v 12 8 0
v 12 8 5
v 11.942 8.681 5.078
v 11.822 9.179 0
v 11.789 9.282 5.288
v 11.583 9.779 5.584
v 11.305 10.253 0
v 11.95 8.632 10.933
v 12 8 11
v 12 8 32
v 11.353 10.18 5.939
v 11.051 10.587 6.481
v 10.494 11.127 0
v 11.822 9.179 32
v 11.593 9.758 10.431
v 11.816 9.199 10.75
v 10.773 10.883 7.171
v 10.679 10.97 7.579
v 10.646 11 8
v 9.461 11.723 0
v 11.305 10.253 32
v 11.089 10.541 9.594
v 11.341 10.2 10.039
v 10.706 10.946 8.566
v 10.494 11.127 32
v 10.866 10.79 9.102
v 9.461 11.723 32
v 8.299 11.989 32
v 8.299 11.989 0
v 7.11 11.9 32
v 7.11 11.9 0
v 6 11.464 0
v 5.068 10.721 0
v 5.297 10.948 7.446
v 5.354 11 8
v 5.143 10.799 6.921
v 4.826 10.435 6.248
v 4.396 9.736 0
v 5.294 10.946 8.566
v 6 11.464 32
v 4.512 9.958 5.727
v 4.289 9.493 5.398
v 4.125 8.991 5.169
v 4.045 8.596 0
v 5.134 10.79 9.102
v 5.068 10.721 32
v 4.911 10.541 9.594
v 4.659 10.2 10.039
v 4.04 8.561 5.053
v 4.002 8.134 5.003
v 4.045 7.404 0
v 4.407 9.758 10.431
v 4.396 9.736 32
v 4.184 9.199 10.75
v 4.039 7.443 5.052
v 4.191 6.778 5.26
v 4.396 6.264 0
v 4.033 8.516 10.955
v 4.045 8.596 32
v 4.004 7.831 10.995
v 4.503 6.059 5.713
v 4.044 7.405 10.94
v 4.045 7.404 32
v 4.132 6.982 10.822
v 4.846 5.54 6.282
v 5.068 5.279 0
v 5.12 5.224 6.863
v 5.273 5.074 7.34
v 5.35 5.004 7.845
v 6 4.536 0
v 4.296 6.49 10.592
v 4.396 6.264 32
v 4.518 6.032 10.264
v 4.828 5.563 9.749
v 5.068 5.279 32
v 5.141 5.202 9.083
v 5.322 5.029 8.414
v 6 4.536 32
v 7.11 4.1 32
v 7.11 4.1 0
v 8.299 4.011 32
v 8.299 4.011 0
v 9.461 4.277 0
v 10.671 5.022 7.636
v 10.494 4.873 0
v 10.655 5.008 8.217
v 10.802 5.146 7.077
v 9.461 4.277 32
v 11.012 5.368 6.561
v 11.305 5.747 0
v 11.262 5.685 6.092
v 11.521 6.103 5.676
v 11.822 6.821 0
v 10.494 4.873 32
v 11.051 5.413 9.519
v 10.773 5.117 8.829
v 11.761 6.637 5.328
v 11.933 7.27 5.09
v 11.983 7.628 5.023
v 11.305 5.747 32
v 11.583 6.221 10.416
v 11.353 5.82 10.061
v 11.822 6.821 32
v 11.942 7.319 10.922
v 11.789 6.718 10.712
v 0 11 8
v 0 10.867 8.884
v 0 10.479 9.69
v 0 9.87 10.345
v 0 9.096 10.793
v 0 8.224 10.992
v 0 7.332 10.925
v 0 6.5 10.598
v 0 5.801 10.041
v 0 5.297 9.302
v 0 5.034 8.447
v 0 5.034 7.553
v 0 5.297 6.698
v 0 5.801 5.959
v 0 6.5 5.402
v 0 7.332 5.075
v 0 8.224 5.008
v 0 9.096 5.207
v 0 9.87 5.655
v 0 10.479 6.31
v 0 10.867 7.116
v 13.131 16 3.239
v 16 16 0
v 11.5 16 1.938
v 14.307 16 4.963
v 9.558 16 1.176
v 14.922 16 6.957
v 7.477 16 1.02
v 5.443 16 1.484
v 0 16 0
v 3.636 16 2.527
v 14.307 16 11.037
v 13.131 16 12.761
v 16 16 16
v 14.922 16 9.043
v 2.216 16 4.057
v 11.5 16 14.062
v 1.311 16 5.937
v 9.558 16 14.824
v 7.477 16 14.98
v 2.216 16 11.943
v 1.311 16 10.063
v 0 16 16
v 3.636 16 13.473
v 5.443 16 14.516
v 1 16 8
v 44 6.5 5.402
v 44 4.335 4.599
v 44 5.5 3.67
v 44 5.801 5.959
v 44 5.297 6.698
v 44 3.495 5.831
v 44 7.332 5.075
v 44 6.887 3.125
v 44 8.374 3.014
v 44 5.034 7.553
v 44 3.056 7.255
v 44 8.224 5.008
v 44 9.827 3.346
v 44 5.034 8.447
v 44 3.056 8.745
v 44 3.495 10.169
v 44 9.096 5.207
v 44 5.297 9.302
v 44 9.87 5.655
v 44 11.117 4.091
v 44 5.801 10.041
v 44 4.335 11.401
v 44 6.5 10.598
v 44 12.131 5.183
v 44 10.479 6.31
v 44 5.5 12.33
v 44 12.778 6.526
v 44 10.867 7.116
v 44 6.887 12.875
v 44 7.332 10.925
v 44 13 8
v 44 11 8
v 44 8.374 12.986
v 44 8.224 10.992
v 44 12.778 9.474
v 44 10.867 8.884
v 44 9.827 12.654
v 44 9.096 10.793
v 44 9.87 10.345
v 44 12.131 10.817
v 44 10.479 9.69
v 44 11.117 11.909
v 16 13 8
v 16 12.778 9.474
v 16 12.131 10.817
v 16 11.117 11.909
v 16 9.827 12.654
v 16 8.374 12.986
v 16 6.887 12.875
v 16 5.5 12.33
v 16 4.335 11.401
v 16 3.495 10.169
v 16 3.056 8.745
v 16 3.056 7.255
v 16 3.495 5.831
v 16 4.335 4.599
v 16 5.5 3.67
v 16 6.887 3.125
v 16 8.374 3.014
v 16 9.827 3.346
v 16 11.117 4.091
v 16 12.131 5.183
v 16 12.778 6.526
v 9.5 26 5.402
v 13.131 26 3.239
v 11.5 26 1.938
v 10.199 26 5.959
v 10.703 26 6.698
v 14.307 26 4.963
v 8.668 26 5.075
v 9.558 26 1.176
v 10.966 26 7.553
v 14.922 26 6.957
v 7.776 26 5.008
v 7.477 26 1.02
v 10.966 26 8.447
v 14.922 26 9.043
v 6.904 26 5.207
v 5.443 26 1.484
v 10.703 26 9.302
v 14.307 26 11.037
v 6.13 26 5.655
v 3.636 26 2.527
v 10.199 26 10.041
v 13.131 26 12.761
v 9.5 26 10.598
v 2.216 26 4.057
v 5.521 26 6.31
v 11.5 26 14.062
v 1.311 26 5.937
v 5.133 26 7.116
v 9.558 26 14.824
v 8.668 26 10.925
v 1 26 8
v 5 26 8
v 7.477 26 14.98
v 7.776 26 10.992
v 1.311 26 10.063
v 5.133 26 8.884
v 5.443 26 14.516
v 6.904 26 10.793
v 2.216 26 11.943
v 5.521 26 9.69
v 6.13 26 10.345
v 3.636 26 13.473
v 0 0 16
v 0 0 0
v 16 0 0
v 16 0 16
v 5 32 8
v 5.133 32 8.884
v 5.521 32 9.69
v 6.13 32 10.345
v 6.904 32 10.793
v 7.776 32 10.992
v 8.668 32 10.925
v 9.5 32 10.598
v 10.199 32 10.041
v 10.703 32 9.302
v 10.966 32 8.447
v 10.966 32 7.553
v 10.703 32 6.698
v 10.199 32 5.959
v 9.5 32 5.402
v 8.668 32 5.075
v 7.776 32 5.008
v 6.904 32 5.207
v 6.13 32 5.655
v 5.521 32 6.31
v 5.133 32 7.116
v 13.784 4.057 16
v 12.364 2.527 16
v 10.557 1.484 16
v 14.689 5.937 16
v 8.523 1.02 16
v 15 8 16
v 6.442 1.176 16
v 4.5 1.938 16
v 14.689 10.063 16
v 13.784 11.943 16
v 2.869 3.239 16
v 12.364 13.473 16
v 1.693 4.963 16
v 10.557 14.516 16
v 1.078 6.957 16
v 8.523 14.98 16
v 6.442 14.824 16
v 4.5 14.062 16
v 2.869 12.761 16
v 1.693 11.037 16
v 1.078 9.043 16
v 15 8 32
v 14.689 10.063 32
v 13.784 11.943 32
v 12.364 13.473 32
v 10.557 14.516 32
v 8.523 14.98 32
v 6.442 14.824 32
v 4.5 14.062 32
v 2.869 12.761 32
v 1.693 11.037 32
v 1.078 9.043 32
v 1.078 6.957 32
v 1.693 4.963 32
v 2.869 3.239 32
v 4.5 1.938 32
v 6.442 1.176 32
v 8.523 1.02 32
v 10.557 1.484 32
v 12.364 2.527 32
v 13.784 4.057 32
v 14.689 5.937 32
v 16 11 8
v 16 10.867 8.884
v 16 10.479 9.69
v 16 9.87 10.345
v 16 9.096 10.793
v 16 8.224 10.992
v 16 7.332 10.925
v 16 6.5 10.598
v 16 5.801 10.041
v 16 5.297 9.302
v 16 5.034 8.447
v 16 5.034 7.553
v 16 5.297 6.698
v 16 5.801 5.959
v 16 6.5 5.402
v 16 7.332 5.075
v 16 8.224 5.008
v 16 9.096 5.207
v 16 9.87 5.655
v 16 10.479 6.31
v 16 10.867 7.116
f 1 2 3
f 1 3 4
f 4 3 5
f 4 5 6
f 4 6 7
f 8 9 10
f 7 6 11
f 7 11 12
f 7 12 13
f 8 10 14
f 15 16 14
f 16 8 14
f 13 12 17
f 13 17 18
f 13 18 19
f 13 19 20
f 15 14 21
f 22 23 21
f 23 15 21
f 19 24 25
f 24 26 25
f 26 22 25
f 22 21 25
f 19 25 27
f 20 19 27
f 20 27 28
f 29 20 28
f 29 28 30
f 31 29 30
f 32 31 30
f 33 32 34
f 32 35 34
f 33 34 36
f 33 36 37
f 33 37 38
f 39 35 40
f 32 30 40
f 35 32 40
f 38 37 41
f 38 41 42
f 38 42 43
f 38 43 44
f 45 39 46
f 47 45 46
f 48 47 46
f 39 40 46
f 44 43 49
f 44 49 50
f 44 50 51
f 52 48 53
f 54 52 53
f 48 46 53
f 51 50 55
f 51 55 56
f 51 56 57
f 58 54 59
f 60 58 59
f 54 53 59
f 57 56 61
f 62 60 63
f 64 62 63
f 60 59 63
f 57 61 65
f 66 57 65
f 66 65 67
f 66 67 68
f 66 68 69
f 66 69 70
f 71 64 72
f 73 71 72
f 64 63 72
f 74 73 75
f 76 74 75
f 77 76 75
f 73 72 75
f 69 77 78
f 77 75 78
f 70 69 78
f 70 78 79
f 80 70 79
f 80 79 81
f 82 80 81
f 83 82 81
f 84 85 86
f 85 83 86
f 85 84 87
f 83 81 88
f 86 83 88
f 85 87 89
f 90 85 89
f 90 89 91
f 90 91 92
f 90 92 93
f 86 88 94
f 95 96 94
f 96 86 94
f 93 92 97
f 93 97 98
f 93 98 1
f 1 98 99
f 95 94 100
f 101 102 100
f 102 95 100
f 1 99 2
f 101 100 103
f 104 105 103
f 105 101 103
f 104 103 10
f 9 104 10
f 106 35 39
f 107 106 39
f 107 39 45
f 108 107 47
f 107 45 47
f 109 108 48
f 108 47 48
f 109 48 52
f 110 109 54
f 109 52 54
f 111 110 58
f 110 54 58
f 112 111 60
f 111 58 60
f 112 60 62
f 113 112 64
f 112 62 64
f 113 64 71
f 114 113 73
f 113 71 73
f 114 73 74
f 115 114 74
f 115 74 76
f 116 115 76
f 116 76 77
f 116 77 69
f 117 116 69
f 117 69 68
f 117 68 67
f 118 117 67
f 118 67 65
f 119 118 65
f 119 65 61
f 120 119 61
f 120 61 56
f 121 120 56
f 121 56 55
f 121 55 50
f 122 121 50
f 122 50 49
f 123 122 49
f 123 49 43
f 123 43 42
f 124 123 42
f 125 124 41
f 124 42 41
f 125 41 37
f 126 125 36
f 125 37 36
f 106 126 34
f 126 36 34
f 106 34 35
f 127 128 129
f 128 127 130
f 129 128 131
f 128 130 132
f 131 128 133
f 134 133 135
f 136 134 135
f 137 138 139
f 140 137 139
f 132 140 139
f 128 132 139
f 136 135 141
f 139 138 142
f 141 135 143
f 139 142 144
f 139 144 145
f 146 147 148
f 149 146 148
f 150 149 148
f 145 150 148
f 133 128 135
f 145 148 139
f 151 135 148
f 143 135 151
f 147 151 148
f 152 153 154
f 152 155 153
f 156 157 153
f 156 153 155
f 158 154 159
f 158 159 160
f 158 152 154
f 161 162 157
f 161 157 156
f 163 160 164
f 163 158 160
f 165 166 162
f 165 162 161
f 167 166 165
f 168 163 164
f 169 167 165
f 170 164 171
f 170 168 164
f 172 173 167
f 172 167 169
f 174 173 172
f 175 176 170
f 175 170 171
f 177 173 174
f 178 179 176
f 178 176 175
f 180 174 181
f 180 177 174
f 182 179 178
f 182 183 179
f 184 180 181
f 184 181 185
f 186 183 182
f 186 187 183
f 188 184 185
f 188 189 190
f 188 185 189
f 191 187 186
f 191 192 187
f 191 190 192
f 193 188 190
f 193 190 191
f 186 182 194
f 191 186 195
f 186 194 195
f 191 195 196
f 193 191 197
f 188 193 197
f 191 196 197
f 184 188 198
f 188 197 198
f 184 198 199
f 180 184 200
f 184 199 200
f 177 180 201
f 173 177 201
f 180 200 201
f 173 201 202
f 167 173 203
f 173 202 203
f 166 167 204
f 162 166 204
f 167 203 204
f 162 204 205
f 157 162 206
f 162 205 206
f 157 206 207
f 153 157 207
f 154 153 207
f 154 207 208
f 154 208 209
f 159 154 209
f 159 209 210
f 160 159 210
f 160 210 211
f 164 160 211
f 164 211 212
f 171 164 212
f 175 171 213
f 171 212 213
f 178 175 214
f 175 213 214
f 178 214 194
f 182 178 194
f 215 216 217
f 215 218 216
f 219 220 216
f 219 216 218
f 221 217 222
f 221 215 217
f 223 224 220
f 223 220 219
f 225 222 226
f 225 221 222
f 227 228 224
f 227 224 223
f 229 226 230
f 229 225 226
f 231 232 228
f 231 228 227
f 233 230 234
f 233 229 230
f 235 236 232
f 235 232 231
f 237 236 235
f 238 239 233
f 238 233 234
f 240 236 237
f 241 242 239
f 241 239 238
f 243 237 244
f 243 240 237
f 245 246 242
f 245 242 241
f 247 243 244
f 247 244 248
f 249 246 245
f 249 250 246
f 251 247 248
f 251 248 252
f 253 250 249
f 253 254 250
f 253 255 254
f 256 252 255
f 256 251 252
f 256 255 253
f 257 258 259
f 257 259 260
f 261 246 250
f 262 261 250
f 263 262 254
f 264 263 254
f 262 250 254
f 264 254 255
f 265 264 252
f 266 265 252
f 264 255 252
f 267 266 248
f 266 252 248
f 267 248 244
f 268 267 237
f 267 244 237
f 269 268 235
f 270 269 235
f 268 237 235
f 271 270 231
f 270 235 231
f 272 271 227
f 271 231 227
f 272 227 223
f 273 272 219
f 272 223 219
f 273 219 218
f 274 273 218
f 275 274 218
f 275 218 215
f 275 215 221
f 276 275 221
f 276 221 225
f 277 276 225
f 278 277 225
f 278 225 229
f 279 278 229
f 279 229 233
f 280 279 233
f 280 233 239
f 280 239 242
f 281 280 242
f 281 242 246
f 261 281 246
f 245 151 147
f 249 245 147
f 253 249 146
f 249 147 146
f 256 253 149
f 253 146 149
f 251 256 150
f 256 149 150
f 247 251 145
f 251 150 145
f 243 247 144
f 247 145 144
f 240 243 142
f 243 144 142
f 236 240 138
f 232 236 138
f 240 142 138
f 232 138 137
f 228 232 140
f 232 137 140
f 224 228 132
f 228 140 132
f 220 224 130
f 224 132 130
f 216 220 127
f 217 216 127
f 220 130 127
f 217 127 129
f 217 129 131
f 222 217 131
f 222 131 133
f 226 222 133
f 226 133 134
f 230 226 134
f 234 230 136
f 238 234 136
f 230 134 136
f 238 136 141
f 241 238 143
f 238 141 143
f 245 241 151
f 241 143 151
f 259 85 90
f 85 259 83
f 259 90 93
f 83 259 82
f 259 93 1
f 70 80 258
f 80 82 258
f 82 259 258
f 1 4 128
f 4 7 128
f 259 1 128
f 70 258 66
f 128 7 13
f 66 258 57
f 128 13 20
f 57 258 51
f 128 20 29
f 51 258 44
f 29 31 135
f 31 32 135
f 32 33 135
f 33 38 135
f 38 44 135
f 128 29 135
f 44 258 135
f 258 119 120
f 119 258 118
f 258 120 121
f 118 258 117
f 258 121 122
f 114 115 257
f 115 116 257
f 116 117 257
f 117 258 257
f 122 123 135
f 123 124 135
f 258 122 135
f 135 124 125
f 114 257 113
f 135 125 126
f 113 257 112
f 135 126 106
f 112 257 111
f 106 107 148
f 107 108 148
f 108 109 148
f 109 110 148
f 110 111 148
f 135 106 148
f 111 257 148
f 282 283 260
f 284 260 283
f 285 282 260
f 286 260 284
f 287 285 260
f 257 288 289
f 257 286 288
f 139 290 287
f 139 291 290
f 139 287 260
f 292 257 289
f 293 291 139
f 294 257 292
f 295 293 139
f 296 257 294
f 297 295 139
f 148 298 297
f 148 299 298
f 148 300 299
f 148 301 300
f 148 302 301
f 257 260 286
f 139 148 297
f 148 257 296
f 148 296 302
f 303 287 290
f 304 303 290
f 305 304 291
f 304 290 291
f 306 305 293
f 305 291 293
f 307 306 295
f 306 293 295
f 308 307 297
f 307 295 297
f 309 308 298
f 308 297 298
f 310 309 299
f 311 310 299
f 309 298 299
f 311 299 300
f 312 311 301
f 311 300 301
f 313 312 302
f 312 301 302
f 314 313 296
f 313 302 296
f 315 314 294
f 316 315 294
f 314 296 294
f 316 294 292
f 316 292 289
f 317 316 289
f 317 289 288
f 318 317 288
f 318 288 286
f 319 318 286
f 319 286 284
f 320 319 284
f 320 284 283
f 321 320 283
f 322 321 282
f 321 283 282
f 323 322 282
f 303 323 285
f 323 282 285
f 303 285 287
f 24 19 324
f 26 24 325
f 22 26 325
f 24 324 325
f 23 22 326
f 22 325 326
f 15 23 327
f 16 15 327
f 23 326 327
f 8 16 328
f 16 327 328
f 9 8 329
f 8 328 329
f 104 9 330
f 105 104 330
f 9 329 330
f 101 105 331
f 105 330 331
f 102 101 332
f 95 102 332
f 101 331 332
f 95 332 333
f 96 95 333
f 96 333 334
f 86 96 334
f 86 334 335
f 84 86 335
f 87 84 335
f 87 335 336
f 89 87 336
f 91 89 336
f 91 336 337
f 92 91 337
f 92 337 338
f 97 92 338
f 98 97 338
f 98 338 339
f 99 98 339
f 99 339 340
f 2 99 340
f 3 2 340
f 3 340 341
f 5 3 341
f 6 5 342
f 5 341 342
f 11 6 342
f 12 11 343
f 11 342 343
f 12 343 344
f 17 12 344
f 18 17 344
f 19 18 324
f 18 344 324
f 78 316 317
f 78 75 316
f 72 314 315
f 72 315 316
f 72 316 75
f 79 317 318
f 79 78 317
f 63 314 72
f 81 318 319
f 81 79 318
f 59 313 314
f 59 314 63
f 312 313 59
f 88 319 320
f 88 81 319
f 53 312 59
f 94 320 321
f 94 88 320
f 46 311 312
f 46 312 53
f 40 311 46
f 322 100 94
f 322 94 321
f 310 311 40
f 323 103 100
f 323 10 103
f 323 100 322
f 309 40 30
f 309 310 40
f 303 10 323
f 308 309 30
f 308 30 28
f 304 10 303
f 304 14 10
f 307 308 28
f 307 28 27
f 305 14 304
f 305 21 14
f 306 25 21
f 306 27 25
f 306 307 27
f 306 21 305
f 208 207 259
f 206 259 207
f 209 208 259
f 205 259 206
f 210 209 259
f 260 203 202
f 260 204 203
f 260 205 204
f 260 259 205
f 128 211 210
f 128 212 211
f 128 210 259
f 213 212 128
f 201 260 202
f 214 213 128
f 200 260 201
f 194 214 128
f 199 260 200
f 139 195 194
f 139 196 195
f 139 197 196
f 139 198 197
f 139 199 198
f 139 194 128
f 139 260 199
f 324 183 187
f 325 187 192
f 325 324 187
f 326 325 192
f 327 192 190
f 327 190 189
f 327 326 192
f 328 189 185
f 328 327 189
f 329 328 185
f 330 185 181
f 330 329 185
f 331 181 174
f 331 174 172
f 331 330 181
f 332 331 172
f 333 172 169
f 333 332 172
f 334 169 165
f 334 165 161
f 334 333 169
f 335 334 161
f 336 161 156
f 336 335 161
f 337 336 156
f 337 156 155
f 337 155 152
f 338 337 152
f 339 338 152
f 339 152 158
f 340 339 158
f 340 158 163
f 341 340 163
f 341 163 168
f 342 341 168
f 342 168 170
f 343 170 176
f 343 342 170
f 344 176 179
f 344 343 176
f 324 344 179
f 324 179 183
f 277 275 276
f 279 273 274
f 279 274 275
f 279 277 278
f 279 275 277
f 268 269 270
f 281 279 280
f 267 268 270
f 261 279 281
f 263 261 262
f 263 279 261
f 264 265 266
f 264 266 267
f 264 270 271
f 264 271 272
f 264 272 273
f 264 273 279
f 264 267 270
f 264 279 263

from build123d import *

# Parameters (mm, degrees)
F0_W      = 16
F0_H      = 16
F1_DEPTH  = 16
F2_R      = 7
F3_DEPTH  = 16
F4_R      = 4
F5_DEPTH  = 34
F6_R      = 3
F7_DEPTH  = 18
F6_R_2    = 5
F8_DEPTH  = 28
F9_R      = 3
F10_DEPTH = 16
F9_R_2    = 7
F11_DEPTH = 10


with BuildPart() as f1:
    # F0 (on Right) → F1 (new body)
    with BuildSketch(Plane.YZ):
        with Locations((8, 8)):
            Rectangle(F0_W, F0_H)
    extrude(amount=F1_DEPTH)

    # F2 (on face) → F3 (join)
    with BuildSketch(Plane.XY.offset(16)):
        with Locations((8, 8)):
            Circle(F2_R)
    extrude(amount=F3_DEPTH)

    # F4 (on face) → F5 (cut)
    with BuildSketch(Plane.XY.offset(32)):
        with Locations((8, 8)):
            Circle(F4_R)
    extrude(amount=-F5_DEPTH, mode=Mode.SUBTRACT)

    # F6 (on face) → F7 (cut)
    with BuildSketch(Plane.YZ.offset(16)):
        with Locations((8, 8)):
            Circle(F6_R)
    extrude(amount=-F7_DEPTH, mode=Mode.SUBTRACT)

    # F6 (on face) → F8 (join)
    with BuildSketch(Plane.YZ.offset(16)):
        with Locations((8, 8)):
            Circle(F6_R_2)
        with Locations((8, 8)):
            Circle(F6_R, mode=Mode.SUBTRACT)
    extrude(amount=F8_DEPTH)

    # F9 (on face) → F10 (join)
    with BuildSketch(Plane(origin=(0, 16, 0), x_dir=(-1, 0, 0), z_dir=(0, 1, 0))):
        with Locations((-8, 8)):
            Circle(F9_R)
    extrude(amount=F10_DEPTH)

    # F9 (on face) → F11 (join)
    with BuildSketch(Plane(origin=(0, 16, 0), x_dir=(-1, 0, 0), z_dir=(0, 1, 0))):
        with Locations((-8, 8)):
            Circle(F9_R_2)
        with Locations((-8, 8)):
            Circle(F9_R, mode=Mode.SUBTRACT)
    extrude(amount=F11_DEPTH)


solid = f1.part
